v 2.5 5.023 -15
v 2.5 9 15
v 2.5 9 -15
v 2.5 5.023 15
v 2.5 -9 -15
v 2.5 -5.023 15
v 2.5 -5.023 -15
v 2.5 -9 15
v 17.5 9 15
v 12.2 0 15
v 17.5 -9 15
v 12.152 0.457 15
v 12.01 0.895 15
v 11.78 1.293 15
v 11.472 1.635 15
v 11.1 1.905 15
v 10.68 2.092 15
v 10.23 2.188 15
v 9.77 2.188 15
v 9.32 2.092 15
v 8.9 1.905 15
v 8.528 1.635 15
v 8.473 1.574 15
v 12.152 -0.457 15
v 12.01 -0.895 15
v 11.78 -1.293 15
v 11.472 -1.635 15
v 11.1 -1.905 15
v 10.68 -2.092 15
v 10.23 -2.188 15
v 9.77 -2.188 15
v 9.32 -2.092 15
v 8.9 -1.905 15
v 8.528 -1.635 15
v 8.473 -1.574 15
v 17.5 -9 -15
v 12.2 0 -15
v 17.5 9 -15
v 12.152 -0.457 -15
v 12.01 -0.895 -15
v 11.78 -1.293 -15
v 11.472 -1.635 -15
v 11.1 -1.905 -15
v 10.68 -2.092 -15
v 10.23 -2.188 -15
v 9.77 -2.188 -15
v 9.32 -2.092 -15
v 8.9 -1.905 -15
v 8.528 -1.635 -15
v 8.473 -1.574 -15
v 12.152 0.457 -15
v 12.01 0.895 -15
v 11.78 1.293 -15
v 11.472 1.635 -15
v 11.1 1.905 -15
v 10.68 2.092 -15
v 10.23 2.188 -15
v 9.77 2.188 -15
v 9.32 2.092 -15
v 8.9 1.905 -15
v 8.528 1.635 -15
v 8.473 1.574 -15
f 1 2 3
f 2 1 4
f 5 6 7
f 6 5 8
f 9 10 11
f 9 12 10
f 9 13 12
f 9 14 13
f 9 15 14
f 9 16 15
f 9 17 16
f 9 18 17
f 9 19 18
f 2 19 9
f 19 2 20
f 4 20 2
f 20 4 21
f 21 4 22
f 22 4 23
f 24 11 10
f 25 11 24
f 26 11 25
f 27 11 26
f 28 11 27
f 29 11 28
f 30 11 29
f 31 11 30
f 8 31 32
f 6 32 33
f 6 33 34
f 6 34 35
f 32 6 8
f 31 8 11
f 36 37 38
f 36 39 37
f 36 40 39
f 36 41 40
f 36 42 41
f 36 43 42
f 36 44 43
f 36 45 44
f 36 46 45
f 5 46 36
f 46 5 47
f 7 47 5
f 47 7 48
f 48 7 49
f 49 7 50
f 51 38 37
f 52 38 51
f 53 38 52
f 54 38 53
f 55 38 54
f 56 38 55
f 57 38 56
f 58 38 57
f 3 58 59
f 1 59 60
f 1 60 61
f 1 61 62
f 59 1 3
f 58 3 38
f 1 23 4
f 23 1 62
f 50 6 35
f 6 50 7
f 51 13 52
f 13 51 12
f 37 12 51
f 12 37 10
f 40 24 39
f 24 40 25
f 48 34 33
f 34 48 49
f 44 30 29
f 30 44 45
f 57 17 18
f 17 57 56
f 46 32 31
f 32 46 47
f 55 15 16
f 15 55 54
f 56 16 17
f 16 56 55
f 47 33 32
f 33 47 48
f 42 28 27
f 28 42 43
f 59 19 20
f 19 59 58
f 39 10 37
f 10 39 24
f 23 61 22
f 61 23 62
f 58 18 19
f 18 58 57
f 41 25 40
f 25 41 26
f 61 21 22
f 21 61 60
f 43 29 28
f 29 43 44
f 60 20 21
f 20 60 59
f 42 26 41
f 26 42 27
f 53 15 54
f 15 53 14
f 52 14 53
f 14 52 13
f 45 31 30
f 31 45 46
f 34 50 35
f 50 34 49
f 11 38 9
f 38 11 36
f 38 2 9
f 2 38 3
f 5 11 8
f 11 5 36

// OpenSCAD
$fn=30;
weight=5;
length=5;
height=30;
//this code contain both female and male dovetail.
difference (){
    //femail dovetail
    translate([10,0,0])cube([length*3,(weight*2)+8,height],center=true);
    //male dovetail
    union (){
    cube([length,weight*2,height],center=true);
    translate([5.4,0,0])cylinder(r=weight*1.16,h=height,center=true,$fn=3);
    translate([10,0,0])cylinder(r=(weight/2.5)*1.1,h=height,center=true);
    }
}
